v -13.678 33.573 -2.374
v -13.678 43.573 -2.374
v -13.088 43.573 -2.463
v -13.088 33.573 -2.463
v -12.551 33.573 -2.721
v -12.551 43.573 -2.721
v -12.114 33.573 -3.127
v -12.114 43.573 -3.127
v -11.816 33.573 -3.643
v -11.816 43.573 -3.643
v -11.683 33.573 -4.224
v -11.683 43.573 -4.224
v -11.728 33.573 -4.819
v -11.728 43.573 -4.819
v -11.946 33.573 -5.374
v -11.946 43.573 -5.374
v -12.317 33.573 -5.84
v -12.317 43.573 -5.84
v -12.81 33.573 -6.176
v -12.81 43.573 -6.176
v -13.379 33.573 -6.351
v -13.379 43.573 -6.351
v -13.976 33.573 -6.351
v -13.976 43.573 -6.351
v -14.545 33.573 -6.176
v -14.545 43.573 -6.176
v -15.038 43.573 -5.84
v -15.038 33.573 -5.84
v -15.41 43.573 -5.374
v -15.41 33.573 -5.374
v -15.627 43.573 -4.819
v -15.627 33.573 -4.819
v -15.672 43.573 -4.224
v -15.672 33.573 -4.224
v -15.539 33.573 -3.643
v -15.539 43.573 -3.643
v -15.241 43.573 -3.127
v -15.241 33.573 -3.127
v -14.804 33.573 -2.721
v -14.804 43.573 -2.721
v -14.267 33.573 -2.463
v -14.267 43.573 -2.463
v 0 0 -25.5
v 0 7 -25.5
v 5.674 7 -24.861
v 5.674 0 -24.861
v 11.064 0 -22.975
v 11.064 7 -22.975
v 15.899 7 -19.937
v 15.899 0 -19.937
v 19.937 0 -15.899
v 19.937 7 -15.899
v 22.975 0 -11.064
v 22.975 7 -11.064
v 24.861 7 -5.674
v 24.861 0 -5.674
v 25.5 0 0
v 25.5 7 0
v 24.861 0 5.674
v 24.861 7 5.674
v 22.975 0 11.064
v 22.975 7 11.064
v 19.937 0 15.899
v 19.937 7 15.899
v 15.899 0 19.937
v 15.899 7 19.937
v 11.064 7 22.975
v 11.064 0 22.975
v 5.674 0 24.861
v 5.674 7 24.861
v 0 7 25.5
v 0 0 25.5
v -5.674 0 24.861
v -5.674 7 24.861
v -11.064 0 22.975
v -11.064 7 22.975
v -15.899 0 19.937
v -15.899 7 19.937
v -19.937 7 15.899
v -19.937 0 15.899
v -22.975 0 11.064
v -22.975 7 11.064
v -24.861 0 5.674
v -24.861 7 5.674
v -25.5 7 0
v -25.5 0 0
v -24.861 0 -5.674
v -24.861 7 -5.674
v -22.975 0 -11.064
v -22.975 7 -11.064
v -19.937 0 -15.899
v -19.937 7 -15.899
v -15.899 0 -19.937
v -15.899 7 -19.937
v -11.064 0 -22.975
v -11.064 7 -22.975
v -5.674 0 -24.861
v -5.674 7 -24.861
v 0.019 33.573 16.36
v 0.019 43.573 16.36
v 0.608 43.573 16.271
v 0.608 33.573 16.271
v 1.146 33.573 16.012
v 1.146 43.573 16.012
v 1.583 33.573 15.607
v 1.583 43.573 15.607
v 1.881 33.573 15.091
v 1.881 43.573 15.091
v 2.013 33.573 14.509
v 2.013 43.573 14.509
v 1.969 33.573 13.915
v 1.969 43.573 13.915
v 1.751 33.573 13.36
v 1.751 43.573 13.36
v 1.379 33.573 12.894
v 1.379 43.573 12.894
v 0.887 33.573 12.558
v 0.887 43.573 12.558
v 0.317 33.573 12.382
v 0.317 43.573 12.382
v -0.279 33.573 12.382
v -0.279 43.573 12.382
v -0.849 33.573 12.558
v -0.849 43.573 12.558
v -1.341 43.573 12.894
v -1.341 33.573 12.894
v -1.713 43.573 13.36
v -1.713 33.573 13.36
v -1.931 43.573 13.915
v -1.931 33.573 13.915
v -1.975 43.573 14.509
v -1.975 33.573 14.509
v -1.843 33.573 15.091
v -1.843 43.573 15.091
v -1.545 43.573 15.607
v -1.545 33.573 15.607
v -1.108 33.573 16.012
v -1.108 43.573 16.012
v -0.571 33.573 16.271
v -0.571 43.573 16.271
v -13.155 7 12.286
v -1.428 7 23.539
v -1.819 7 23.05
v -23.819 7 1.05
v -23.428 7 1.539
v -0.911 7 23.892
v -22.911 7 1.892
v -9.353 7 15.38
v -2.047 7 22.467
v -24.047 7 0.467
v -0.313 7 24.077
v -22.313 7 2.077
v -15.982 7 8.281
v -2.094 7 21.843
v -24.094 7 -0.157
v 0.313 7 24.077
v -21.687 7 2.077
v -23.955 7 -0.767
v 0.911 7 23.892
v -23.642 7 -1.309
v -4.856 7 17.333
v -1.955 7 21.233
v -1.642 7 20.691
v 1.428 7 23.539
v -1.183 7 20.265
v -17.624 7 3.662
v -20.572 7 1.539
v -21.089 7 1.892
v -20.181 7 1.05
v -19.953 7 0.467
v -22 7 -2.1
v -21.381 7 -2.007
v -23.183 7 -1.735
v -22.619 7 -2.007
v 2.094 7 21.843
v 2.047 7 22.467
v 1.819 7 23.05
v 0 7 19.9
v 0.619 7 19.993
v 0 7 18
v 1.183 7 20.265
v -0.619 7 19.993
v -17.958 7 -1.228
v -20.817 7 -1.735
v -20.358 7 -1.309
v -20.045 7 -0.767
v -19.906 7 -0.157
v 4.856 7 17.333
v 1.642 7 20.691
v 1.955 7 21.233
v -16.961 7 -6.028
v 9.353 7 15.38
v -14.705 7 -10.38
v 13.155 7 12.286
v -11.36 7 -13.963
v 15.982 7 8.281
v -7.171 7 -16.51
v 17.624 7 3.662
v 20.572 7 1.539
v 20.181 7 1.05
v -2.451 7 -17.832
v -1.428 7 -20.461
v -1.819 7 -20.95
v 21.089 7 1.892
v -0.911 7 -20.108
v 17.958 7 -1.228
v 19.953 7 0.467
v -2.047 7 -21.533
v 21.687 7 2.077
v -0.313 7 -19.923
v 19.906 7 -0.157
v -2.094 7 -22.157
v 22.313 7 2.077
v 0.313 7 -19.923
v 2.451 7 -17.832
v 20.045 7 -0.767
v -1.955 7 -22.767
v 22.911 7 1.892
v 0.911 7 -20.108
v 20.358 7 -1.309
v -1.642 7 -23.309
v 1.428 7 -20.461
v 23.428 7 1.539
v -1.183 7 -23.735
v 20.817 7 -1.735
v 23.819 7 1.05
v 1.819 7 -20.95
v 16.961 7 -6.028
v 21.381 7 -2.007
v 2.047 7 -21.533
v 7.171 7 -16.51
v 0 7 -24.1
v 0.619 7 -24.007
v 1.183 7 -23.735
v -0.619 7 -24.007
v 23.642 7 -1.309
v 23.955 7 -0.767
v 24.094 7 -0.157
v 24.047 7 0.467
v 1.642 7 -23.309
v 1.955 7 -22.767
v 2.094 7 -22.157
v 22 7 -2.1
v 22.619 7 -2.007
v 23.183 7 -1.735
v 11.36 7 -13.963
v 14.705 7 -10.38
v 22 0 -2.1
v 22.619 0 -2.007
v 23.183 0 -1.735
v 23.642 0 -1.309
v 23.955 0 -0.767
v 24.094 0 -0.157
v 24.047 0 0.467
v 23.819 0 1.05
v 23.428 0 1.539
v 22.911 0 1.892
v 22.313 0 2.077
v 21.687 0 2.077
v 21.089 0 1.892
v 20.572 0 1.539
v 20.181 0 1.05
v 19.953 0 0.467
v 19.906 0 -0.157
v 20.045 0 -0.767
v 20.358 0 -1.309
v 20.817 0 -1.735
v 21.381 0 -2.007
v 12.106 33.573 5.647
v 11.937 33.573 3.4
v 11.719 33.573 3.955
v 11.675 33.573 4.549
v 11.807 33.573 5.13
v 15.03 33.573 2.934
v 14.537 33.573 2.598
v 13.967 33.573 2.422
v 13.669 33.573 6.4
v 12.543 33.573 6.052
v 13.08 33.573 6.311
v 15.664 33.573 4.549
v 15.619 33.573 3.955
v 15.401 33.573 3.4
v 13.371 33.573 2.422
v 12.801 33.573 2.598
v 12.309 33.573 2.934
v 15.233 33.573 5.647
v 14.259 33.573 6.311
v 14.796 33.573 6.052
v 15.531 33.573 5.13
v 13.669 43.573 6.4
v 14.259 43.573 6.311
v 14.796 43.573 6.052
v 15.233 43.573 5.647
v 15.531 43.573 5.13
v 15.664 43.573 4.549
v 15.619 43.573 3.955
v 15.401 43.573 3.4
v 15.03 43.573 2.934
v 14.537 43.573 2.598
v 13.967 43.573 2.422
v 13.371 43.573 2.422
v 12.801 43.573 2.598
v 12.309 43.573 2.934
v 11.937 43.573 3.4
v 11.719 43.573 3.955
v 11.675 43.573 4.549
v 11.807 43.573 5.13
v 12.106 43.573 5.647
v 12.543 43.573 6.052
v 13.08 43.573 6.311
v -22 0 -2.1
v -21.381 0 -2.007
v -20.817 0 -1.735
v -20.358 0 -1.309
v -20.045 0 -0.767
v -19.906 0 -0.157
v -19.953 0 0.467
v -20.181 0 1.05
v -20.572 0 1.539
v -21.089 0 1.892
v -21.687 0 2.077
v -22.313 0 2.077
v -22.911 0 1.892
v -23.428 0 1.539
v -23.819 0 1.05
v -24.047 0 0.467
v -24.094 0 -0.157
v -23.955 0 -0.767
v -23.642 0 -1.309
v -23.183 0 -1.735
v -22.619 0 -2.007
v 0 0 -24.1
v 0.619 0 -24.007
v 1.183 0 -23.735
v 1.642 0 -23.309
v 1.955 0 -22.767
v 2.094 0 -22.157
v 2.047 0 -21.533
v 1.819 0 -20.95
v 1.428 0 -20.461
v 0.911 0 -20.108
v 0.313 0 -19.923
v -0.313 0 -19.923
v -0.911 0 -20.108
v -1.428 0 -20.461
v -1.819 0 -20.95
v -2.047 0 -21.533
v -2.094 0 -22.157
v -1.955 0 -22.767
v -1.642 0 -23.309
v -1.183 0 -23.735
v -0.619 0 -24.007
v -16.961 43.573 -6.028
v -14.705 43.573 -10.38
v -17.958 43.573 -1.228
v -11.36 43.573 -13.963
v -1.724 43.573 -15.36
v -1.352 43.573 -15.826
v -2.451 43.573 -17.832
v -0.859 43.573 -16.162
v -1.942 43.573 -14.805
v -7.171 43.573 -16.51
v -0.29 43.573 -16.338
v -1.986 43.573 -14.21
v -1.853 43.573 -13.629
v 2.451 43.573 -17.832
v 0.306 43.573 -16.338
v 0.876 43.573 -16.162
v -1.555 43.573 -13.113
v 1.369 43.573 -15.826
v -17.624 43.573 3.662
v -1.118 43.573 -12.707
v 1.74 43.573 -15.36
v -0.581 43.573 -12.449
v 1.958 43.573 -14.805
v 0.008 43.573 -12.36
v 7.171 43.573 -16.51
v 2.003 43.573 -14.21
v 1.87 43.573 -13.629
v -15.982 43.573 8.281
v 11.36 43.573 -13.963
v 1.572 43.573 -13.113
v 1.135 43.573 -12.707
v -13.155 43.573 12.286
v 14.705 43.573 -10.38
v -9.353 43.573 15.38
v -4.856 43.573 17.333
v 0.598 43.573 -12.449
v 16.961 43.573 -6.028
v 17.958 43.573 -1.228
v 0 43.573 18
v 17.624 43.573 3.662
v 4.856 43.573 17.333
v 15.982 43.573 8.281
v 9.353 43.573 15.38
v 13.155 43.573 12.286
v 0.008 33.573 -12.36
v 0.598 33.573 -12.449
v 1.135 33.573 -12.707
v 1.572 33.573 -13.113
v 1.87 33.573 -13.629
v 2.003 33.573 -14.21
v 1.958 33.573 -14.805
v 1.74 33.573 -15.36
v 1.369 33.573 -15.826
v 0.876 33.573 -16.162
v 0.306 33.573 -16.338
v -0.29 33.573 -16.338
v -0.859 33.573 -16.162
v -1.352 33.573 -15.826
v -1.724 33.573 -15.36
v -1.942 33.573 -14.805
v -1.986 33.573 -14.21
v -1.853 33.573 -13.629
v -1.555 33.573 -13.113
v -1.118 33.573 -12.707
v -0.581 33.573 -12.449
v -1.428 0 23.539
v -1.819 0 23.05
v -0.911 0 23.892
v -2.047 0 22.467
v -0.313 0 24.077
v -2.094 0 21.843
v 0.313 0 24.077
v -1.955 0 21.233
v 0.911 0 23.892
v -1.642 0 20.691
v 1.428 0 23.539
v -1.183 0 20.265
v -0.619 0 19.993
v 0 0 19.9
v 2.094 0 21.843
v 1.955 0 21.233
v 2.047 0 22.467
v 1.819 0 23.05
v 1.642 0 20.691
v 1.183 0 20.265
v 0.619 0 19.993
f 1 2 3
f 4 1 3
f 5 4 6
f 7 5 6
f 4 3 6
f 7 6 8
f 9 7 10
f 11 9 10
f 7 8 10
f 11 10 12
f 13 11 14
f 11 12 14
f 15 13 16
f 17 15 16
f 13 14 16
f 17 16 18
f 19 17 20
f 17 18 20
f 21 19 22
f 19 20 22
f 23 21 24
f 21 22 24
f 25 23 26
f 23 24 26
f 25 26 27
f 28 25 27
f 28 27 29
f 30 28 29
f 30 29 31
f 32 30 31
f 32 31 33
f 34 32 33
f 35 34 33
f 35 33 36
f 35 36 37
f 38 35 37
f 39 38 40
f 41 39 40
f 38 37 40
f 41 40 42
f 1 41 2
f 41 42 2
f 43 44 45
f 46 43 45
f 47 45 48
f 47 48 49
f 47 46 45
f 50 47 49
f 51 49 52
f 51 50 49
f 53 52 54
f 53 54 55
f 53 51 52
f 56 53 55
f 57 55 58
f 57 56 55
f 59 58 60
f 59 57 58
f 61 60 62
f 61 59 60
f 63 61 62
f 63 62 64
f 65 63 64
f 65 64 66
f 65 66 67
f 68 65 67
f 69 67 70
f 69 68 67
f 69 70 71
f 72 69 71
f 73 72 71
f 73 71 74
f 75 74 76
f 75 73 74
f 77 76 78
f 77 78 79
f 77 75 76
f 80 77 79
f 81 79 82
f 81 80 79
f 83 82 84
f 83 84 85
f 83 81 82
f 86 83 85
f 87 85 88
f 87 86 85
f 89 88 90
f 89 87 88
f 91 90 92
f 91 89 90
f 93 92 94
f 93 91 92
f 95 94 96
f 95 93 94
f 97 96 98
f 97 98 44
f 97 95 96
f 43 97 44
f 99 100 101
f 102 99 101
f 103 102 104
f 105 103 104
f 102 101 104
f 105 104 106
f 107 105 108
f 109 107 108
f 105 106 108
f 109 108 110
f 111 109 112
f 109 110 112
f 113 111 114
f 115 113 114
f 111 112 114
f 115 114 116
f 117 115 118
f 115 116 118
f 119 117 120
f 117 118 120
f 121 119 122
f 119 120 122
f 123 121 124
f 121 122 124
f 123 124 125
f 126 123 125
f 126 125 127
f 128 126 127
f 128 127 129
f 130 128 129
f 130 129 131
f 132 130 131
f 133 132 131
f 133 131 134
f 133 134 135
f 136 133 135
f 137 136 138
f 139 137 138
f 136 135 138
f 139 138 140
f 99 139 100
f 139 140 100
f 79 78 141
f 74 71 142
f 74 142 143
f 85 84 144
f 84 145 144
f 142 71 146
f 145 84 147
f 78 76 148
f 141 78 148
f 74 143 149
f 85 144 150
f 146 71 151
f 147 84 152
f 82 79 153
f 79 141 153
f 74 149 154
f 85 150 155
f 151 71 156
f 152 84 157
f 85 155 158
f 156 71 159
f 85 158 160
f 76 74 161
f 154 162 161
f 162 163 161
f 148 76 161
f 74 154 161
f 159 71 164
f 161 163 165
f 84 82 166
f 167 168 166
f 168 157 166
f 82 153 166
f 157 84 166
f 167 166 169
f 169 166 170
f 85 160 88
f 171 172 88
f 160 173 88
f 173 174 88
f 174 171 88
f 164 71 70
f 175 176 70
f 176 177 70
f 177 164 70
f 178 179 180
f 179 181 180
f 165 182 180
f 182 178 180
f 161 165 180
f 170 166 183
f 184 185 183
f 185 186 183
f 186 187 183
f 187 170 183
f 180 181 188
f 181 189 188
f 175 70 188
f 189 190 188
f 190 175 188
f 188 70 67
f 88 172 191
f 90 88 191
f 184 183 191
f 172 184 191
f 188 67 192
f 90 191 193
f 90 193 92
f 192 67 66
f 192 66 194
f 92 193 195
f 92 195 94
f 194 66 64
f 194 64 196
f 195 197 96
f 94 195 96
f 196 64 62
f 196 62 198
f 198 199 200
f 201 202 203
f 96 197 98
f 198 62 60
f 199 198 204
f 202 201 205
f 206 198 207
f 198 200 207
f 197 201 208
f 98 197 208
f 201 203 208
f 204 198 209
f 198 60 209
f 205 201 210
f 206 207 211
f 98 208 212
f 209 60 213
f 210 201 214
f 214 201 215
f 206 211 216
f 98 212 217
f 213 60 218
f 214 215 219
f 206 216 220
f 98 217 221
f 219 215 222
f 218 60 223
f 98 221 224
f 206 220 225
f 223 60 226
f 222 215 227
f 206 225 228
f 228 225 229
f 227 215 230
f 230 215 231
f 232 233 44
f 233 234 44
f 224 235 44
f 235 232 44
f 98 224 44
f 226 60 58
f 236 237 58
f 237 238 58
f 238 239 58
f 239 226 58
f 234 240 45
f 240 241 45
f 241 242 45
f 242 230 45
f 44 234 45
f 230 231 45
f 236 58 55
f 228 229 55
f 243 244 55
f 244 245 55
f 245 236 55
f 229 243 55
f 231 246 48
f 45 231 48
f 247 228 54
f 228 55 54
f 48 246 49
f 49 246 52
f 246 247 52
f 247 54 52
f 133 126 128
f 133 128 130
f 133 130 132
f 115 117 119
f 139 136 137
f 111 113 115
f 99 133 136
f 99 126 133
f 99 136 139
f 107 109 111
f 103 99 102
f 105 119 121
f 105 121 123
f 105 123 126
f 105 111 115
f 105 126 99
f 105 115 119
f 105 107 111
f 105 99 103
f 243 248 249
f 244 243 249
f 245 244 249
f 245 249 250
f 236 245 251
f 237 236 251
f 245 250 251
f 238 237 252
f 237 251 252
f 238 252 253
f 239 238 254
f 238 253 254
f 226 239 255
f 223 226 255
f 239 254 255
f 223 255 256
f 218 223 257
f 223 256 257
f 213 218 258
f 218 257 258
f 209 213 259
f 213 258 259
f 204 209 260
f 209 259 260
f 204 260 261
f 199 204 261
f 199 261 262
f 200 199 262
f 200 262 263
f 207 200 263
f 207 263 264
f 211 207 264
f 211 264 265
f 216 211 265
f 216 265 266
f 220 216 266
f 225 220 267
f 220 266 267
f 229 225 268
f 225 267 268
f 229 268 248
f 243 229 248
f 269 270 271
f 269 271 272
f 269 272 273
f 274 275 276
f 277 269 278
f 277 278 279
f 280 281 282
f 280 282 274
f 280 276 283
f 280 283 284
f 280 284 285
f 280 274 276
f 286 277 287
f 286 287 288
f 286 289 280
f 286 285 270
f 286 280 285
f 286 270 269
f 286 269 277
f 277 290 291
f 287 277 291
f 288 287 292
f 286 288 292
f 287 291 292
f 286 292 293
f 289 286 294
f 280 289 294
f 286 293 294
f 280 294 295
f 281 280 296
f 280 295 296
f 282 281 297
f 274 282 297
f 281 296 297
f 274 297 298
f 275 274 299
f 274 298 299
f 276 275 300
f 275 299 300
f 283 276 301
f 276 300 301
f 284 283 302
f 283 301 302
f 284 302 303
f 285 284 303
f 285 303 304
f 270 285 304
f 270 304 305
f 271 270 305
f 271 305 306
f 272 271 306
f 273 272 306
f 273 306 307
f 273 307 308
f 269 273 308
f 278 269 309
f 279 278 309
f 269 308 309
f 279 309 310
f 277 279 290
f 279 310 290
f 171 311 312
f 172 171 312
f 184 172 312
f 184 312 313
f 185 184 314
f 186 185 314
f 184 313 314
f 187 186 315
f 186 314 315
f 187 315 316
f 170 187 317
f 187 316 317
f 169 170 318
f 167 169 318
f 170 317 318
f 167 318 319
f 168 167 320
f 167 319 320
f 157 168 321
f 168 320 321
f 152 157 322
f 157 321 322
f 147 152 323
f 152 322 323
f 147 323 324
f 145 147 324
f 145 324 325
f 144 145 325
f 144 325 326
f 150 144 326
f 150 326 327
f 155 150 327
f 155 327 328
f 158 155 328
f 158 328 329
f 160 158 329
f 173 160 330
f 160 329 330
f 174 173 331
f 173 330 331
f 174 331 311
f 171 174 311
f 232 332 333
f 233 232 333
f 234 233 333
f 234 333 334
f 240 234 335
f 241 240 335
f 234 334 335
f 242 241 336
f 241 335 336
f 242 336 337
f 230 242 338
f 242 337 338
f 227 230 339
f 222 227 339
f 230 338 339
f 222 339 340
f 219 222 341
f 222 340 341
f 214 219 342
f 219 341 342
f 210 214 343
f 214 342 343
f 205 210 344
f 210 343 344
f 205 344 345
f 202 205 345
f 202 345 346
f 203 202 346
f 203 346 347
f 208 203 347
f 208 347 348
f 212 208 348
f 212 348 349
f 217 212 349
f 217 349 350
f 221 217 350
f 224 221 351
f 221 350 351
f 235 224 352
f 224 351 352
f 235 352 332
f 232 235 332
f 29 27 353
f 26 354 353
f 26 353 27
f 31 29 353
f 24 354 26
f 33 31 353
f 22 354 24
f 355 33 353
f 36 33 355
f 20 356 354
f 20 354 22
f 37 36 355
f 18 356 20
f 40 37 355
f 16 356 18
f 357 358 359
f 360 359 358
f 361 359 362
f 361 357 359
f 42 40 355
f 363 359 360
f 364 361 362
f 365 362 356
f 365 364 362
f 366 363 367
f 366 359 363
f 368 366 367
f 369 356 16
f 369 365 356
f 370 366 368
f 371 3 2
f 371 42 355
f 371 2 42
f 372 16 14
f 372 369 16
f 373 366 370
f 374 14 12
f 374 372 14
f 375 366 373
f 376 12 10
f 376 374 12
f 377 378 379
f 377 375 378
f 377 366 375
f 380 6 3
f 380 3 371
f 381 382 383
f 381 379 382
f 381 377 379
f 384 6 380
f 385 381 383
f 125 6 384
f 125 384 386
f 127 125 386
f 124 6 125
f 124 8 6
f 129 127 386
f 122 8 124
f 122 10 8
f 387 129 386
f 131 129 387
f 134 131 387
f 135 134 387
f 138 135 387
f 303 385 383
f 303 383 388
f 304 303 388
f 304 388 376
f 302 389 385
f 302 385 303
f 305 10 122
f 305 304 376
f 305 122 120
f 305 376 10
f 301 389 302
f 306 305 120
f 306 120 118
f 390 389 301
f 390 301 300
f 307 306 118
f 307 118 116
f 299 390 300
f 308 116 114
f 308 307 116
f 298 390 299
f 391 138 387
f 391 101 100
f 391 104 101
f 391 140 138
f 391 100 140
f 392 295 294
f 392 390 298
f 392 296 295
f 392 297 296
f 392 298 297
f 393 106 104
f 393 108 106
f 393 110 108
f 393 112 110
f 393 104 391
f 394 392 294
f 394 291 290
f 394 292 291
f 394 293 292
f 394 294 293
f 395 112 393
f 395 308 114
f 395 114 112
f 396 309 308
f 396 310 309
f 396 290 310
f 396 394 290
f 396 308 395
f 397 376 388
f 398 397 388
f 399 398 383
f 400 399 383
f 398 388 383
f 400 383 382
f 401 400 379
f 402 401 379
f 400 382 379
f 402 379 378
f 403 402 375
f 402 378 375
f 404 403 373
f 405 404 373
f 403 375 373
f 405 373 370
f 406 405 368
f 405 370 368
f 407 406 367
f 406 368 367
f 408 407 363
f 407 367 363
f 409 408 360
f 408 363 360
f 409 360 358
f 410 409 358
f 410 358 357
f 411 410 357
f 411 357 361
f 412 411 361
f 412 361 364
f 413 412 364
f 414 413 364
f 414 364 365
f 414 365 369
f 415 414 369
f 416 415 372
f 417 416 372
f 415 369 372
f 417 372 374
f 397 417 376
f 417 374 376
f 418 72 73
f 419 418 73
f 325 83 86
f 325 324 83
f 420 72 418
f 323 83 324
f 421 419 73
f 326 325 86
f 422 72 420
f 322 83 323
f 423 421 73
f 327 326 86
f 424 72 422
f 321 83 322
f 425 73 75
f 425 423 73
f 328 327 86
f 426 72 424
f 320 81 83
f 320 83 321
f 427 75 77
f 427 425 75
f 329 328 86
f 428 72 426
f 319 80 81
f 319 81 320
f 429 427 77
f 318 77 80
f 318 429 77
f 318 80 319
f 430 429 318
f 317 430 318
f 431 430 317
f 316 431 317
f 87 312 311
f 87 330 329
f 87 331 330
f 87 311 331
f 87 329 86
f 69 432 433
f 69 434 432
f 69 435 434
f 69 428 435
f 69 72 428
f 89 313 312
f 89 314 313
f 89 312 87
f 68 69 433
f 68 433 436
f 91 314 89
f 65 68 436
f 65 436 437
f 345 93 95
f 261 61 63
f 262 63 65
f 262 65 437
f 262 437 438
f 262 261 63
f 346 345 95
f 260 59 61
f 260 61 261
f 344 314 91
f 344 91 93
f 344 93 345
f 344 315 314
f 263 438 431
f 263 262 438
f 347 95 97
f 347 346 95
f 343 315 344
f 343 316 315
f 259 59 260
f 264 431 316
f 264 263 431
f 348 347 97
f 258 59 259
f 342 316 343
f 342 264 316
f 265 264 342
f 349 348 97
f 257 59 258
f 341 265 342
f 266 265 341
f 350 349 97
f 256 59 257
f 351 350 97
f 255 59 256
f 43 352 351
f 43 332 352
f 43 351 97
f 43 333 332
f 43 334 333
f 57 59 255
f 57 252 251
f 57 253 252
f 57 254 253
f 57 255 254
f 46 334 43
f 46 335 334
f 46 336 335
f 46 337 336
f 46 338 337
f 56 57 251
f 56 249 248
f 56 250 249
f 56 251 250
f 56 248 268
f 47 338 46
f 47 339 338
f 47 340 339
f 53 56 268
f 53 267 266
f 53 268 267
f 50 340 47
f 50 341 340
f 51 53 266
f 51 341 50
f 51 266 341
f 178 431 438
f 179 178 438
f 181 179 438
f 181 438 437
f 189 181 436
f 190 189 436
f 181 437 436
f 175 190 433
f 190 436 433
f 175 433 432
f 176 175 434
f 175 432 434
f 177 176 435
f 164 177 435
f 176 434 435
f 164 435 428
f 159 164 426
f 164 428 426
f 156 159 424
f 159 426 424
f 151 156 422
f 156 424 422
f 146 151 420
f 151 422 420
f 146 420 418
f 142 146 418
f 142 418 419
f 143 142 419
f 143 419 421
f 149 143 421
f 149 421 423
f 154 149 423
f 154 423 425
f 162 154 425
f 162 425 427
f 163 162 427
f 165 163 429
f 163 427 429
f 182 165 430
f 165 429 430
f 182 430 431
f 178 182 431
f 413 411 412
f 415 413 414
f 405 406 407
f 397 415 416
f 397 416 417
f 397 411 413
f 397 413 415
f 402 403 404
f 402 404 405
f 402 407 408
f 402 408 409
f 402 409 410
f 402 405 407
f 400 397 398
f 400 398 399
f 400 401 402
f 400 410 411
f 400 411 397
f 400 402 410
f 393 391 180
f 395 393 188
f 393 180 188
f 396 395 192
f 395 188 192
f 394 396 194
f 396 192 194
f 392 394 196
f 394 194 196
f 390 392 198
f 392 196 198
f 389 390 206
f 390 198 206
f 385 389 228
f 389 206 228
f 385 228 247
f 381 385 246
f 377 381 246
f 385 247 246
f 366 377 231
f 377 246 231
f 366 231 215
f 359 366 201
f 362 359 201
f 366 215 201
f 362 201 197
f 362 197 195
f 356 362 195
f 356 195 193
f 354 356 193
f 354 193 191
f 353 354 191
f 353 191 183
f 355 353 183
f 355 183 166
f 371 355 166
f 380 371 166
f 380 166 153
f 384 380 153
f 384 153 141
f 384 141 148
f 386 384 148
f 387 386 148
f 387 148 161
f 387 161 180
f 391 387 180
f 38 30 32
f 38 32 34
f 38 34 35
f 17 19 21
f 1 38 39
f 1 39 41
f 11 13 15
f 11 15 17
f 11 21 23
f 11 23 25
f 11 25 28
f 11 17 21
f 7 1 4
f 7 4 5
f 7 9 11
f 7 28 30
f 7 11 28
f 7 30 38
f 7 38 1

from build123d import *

# Parameters (mm, degrees)
SKETCH_1_R          = 18
EXTRUDE_1_DEPTH     = 43.573
SKETCH_3_R          = 25.5
SKETCH_3_R_2        = 2.1
EXTRUDE_2_DEPTH     = 7
SKETCH_2_R          = 2
CUT_EXTRUDE_1_DEPTH = 10


with BuildPart() as part:
    # Эскиз1 → Бобышка-Вытянуть1 (new body)
    with BuildSketch(Plane(origin=(0, 0, 0), x_dir=(1, 0, 0), z_dir=(0, 1, 0))):
        with Locations(Location((0, 0, 0), (0, 0, 270))):
            Circle(SKETCH_1_R)
    extrude(amount=EXTRUDE_1_DEPTH)

    # Эскиз3 → Бобышка-Вытянуть2 (add)
    with BuildSketch(Plane.XZ):
        with Locations(Location((0, 0, 0), (0, 0, 270))):
            Circle(SKETCH_3_R)
        with Locations(Location((0, 22, 0), (0, 0, 270))):
            Circle(SKETCH_3_R_2, mode=Mode.SUBTRACT)
        with Locations(Location((-22, 0, 0), (0, 0, 270))):
            Circle(SKETCH_3_R_2, mode=Mode.SUBTRACT)
        with Locations(Location((0, -22, 0), (0, 0, 270))):
            Circle(SKETCH_3_R_2, mode=Mode.SUBTRACT)
        with Locations(Location((22, 0, 0), (0, 0, 270))):
            Circle(SKETCH_3_R_2, mode=Mode.SUBTRACT)
    extrude(amount=-EXTRUDE_2_DEPTH)

    # Эскиз2 → Вырез-Вытянуть1 (cut)
    with BuildSketch(Plane(origin=(0, 43.573, 0), x_dir=(1, 0, 0), z_dir=(0, 1, 0))):
        with Locations(Location((0.008308586, 14.359840693, 0), (0, 0, 270))):
            Circle(SKETCH_2_R)
        with Locations(Location((13.669247008, -4.399634075, 0), (0, 0, 270))):
            Circle(SKETCH_2_R)
        with Locations(Location((0.018947935, -14.359830595, 0), (0, 0, 270))):
            Circle(SKETCH_2_R)
        with Locations(Location((-13.677573358, 4.373680464, 0), (0, 0, 270))):
            Circle(SKETCH_2_R)
    extrude(amount=-CUT_EXTRUDE_1_DEPTH, mode=Mode.SUBTRACT)


solid = part.part
